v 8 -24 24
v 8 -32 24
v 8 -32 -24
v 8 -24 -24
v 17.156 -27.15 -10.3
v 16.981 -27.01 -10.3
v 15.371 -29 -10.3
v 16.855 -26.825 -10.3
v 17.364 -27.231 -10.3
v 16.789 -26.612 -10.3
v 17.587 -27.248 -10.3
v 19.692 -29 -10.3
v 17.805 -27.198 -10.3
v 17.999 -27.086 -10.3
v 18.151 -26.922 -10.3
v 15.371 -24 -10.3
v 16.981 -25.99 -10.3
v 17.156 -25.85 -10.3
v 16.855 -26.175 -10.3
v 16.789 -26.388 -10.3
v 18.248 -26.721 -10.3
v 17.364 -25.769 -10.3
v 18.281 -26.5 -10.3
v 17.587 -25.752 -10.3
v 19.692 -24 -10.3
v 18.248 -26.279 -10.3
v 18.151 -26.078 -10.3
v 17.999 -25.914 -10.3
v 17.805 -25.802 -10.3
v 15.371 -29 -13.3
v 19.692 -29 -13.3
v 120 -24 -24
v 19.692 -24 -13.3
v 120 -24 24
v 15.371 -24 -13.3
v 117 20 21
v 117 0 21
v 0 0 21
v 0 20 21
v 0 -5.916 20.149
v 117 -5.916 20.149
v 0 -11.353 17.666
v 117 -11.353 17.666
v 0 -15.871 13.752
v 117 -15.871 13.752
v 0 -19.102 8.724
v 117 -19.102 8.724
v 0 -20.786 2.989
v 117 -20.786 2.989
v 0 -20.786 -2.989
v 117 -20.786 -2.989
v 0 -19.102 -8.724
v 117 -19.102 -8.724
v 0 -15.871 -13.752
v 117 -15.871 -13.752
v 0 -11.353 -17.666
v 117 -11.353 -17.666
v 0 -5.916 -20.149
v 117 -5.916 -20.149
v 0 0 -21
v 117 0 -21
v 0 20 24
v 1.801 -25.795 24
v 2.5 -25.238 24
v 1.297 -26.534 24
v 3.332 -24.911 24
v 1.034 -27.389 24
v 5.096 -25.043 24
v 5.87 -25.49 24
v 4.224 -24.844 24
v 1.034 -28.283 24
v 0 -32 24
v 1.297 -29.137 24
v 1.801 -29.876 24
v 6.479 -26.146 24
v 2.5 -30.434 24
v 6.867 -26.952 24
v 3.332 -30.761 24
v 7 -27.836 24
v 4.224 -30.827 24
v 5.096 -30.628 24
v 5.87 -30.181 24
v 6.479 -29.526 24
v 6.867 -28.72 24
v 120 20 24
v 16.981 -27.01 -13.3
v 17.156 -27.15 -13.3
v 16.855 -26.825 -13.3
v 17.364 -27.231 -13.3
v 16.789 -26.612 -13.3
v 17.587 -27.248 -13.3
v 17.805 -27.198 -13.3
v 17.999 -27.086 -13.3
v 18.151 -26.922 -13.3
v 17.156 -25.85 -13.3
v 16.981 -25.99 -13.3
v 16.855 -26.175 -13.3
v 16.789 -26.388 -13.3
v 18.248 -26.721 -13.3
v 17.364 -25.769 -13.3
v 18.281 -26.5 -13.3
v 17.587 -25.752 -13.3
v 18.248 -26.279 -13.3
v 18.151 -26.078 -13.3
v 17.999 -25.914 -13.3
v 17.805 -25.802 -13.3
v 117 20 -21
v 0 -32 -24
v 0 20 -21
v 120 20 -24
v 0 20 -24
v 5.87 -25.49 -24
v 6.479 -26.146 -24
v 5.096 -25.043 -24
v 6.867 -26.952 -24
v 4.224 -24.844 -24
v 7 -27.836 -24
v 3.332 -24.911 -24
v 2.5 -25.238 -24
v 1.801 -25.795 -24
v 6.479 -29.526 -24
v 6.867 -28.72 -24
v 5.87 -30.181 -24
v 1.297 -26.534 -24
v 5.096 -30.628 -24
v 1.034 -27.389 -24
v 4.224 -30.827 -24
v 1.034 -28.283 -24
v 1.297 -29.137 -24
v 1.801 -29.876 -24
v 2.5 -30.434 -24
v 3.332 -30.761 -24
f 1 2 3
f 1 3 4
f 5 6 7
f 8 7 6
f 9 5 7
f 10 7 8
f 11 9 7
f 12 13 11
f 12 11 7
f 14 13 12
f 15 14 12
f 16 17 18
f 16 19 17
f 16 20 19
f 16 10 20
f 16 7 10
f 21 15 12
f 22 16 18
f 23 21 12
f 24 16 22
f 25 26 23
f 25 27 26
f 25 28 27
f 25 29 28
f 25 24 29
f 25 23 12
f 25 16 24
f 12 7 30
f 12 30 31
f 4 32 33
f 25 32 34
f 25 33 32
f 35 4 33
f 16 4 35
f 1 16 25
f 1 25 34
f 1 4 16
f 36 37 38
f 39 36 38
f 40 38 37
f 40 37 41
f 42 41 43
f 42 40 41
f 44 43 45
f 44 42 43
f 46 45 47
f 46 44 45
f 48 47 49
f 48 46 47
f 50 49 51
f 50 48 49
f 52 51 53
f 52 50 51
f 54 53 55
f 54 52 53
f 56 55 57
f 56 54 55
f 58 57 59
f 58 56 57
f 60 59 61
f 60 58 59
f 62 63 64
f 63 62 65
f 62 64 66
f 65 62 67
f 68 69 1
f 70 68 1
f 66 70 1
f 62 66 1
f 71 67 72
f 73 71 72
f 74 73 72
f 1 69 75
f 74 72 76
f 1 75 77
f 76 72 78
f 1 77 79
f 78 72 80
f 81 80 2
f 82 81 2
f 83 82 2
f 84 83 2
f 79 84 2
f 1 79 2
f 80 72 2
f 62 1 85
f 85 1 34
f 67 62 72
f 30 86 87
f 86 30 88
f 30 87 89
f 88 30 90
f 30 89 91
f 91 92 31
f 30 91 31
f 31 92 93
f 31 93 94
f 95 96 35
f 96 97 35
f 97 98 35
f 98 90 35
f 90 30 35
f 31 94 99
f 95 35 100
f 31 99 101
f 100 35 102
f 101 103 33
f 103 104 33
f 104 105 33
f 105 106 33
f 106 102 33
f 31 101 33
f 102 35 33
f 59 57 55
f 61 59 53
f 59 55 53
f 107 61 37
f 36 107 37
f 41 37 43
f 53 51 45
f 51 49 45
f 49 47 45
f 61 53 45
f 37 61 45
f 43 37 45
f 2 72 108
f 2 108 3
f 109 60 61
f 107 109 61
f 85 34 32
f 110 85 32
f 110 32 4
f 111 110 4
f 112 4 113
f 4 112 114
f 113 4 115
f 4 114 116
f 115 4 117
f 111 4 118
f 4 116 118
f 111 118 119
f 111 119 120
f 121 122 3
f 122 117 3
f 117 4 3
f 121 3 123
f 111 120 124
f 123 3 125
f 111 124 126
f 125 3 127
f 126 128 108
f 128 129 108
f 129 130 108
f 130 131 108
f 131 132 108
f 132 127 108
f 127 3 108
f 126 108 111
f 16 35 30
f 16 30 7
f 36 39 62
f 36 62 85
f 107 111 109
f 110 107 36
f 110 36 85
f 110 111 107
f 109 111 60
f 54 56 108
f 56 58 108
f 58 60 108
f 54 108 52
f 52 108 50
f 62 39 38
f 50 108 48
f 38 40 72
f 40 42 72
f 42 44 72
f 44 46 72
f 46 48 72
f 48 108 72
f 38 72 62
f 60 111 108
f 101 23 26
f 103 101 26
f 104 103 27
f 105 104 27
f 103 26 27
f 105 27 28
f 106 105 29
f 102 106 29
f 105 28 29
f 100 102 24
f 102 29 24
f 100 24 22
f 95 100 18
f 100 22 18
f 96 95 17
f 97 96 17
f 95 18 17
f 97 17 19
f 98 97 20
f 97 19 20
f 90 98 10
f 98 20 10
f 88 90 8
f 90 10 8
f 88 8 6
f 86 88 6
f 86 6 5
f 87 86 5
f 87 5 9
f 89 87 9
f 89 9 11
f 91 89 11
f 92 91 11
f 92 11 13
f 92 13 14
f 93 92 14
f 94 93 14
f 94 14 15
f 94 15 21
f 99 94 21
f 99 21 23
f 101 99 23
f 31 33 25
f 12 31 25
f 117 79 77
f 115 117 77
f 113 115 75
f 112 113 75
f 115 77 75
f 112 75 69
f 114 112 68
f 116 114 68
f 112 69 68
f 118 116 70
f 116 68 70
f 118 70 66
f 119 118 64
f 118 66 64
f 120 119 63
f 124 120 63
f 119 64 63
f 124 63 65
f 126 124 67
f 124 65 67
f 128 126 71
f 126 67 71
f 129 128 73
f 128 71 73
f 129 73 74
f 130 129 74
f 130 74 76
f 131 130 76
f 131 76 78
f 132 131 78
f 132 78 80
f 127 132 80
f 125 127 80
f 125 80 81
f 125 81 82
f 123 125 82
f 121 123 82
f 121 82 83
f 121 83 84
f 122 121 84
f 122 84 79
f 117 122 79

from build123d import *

# Parameters (mm, degrees)
BOSS_EXTRUDE1_DEPTH = 120
SKETCH2_W           = 8
SKETCH2_H           = 8
BOSS_EXTRUDE2_DEPTH = 48
CUT_EXTRUDE1_REACH  = 135.147
SKETCH3_R           = 3
SKETCH4_W           = 48
SKETCH4_H           = 24
BOSS_EXTRUDE3_DEPTH = 3
SKETCH5_W           = 4.321078357
SKETCH5_H           = 3
BOSS_EXTRUDE4_DEPTH = 5
SKETCH6_R           = 0.75
CUT_EXTRUDE2_DEPTH  = 129.842888822
BOSS_EXTRUDE5_DEPTH = 20


with BuildPart() as part:
    # Sketch1 → Boss-Extrude1 (new body)
    with BuildSketch(Plane(origin=(0, 0, 0), x_dir=(0, 0, -1), z_dir=(1, 0, 0))):
        with BuildLine():
            Line((21, 0), (24, 0))
            Line((24, 0), (24, -24))
            Line((24, -24), (-24, -24))
            Line((-24, -24), (-24, 0))
            Line((-24, 0), (-21, 0))
            ThreePointArc((-21, 0), (0, -21), (21, 0))
        make_face()
    extrude(amount=BOSS_EXTRUDE1_DEPTH)

    # Sketch2 → Boss-Extrude2 (add)
    with BuildSketch(Plane.XY.offset(24)):
        with Locations((4, -28)):
            Rectangle(SKETCH2_W, SKETCH2_H)
    extrude(amount=-BOSS_EXTRUDE2_DEPTH)

    # Sketch3 → Cut-Extrude1 (cut, up to next)
    with BuildSketch(Plane.XY.offset(24), mode=Mode.PRIVATE) as cut_extrude1_sk1:
        with Locations((4, -27.835840809)):
            Circle(SKETCH3_R)
    cut_extrude1_tool1 = extrude(cut_extrude1_sk1.sketch, amount=-CUT_EXTRUDE1_REACH, mode=Mode.PRIVATE) & part.part
    add(cut_extrude1_tool1.solids().sort_by_distance((4, -27.835841, 24))[0], mode=Mode.SUBTRACT)

    # Sketch4 → Boss-Extrude3 (add)
    with BuildSketch(Plane(origin=(120, 0, 0), x_dir=(0, 0, -1), z_dir=(1, 0, 0))):
        with Locations((0, -12)):
            Rectangle(SKETCH4_W, SKETCH4_H)
    extrude(amount=-BOSS_EXTRUDE3_DEPTH)

    # Sketch5 → Boss-Extrude4 (add)
    with BuildSketch(Plane.XZ.offset(24)):
        with Locations((17.531080317, -11.8)):
            Rectangle(SKETCH5_W, SKETCH5_H)
    extrude(amount=BOSS_EXTRUDE4_DEPTH)

    # Sketch6 → Cut-Extrude2 (cut, through all)
    with BuildSketch(Plane.XY.offset(-10.3)):
        with Locations((17.531080317, -26.5)):
            Circle(SKETCH6_R)
    extrude(amount=-CUT_EXTRUDE2_DEPTH, mode=Mode.SUBTRACT)

    # Sketch7 → Boss-Extrude5 (add)
    with BuildSketch(Plane(origin=(0, 0, 0), x_dir=(1, 0, 0), z_dir=(0, 1, 0))):
        Polygon((120, 24), (0, 24), (0, 21), (117, 21), (117, -21), (0, -21), (0, -24), (120, -24), align=None)
    extrude(amount=BOSS_EXTRUDE5_DEPTH)


solid = part.part
